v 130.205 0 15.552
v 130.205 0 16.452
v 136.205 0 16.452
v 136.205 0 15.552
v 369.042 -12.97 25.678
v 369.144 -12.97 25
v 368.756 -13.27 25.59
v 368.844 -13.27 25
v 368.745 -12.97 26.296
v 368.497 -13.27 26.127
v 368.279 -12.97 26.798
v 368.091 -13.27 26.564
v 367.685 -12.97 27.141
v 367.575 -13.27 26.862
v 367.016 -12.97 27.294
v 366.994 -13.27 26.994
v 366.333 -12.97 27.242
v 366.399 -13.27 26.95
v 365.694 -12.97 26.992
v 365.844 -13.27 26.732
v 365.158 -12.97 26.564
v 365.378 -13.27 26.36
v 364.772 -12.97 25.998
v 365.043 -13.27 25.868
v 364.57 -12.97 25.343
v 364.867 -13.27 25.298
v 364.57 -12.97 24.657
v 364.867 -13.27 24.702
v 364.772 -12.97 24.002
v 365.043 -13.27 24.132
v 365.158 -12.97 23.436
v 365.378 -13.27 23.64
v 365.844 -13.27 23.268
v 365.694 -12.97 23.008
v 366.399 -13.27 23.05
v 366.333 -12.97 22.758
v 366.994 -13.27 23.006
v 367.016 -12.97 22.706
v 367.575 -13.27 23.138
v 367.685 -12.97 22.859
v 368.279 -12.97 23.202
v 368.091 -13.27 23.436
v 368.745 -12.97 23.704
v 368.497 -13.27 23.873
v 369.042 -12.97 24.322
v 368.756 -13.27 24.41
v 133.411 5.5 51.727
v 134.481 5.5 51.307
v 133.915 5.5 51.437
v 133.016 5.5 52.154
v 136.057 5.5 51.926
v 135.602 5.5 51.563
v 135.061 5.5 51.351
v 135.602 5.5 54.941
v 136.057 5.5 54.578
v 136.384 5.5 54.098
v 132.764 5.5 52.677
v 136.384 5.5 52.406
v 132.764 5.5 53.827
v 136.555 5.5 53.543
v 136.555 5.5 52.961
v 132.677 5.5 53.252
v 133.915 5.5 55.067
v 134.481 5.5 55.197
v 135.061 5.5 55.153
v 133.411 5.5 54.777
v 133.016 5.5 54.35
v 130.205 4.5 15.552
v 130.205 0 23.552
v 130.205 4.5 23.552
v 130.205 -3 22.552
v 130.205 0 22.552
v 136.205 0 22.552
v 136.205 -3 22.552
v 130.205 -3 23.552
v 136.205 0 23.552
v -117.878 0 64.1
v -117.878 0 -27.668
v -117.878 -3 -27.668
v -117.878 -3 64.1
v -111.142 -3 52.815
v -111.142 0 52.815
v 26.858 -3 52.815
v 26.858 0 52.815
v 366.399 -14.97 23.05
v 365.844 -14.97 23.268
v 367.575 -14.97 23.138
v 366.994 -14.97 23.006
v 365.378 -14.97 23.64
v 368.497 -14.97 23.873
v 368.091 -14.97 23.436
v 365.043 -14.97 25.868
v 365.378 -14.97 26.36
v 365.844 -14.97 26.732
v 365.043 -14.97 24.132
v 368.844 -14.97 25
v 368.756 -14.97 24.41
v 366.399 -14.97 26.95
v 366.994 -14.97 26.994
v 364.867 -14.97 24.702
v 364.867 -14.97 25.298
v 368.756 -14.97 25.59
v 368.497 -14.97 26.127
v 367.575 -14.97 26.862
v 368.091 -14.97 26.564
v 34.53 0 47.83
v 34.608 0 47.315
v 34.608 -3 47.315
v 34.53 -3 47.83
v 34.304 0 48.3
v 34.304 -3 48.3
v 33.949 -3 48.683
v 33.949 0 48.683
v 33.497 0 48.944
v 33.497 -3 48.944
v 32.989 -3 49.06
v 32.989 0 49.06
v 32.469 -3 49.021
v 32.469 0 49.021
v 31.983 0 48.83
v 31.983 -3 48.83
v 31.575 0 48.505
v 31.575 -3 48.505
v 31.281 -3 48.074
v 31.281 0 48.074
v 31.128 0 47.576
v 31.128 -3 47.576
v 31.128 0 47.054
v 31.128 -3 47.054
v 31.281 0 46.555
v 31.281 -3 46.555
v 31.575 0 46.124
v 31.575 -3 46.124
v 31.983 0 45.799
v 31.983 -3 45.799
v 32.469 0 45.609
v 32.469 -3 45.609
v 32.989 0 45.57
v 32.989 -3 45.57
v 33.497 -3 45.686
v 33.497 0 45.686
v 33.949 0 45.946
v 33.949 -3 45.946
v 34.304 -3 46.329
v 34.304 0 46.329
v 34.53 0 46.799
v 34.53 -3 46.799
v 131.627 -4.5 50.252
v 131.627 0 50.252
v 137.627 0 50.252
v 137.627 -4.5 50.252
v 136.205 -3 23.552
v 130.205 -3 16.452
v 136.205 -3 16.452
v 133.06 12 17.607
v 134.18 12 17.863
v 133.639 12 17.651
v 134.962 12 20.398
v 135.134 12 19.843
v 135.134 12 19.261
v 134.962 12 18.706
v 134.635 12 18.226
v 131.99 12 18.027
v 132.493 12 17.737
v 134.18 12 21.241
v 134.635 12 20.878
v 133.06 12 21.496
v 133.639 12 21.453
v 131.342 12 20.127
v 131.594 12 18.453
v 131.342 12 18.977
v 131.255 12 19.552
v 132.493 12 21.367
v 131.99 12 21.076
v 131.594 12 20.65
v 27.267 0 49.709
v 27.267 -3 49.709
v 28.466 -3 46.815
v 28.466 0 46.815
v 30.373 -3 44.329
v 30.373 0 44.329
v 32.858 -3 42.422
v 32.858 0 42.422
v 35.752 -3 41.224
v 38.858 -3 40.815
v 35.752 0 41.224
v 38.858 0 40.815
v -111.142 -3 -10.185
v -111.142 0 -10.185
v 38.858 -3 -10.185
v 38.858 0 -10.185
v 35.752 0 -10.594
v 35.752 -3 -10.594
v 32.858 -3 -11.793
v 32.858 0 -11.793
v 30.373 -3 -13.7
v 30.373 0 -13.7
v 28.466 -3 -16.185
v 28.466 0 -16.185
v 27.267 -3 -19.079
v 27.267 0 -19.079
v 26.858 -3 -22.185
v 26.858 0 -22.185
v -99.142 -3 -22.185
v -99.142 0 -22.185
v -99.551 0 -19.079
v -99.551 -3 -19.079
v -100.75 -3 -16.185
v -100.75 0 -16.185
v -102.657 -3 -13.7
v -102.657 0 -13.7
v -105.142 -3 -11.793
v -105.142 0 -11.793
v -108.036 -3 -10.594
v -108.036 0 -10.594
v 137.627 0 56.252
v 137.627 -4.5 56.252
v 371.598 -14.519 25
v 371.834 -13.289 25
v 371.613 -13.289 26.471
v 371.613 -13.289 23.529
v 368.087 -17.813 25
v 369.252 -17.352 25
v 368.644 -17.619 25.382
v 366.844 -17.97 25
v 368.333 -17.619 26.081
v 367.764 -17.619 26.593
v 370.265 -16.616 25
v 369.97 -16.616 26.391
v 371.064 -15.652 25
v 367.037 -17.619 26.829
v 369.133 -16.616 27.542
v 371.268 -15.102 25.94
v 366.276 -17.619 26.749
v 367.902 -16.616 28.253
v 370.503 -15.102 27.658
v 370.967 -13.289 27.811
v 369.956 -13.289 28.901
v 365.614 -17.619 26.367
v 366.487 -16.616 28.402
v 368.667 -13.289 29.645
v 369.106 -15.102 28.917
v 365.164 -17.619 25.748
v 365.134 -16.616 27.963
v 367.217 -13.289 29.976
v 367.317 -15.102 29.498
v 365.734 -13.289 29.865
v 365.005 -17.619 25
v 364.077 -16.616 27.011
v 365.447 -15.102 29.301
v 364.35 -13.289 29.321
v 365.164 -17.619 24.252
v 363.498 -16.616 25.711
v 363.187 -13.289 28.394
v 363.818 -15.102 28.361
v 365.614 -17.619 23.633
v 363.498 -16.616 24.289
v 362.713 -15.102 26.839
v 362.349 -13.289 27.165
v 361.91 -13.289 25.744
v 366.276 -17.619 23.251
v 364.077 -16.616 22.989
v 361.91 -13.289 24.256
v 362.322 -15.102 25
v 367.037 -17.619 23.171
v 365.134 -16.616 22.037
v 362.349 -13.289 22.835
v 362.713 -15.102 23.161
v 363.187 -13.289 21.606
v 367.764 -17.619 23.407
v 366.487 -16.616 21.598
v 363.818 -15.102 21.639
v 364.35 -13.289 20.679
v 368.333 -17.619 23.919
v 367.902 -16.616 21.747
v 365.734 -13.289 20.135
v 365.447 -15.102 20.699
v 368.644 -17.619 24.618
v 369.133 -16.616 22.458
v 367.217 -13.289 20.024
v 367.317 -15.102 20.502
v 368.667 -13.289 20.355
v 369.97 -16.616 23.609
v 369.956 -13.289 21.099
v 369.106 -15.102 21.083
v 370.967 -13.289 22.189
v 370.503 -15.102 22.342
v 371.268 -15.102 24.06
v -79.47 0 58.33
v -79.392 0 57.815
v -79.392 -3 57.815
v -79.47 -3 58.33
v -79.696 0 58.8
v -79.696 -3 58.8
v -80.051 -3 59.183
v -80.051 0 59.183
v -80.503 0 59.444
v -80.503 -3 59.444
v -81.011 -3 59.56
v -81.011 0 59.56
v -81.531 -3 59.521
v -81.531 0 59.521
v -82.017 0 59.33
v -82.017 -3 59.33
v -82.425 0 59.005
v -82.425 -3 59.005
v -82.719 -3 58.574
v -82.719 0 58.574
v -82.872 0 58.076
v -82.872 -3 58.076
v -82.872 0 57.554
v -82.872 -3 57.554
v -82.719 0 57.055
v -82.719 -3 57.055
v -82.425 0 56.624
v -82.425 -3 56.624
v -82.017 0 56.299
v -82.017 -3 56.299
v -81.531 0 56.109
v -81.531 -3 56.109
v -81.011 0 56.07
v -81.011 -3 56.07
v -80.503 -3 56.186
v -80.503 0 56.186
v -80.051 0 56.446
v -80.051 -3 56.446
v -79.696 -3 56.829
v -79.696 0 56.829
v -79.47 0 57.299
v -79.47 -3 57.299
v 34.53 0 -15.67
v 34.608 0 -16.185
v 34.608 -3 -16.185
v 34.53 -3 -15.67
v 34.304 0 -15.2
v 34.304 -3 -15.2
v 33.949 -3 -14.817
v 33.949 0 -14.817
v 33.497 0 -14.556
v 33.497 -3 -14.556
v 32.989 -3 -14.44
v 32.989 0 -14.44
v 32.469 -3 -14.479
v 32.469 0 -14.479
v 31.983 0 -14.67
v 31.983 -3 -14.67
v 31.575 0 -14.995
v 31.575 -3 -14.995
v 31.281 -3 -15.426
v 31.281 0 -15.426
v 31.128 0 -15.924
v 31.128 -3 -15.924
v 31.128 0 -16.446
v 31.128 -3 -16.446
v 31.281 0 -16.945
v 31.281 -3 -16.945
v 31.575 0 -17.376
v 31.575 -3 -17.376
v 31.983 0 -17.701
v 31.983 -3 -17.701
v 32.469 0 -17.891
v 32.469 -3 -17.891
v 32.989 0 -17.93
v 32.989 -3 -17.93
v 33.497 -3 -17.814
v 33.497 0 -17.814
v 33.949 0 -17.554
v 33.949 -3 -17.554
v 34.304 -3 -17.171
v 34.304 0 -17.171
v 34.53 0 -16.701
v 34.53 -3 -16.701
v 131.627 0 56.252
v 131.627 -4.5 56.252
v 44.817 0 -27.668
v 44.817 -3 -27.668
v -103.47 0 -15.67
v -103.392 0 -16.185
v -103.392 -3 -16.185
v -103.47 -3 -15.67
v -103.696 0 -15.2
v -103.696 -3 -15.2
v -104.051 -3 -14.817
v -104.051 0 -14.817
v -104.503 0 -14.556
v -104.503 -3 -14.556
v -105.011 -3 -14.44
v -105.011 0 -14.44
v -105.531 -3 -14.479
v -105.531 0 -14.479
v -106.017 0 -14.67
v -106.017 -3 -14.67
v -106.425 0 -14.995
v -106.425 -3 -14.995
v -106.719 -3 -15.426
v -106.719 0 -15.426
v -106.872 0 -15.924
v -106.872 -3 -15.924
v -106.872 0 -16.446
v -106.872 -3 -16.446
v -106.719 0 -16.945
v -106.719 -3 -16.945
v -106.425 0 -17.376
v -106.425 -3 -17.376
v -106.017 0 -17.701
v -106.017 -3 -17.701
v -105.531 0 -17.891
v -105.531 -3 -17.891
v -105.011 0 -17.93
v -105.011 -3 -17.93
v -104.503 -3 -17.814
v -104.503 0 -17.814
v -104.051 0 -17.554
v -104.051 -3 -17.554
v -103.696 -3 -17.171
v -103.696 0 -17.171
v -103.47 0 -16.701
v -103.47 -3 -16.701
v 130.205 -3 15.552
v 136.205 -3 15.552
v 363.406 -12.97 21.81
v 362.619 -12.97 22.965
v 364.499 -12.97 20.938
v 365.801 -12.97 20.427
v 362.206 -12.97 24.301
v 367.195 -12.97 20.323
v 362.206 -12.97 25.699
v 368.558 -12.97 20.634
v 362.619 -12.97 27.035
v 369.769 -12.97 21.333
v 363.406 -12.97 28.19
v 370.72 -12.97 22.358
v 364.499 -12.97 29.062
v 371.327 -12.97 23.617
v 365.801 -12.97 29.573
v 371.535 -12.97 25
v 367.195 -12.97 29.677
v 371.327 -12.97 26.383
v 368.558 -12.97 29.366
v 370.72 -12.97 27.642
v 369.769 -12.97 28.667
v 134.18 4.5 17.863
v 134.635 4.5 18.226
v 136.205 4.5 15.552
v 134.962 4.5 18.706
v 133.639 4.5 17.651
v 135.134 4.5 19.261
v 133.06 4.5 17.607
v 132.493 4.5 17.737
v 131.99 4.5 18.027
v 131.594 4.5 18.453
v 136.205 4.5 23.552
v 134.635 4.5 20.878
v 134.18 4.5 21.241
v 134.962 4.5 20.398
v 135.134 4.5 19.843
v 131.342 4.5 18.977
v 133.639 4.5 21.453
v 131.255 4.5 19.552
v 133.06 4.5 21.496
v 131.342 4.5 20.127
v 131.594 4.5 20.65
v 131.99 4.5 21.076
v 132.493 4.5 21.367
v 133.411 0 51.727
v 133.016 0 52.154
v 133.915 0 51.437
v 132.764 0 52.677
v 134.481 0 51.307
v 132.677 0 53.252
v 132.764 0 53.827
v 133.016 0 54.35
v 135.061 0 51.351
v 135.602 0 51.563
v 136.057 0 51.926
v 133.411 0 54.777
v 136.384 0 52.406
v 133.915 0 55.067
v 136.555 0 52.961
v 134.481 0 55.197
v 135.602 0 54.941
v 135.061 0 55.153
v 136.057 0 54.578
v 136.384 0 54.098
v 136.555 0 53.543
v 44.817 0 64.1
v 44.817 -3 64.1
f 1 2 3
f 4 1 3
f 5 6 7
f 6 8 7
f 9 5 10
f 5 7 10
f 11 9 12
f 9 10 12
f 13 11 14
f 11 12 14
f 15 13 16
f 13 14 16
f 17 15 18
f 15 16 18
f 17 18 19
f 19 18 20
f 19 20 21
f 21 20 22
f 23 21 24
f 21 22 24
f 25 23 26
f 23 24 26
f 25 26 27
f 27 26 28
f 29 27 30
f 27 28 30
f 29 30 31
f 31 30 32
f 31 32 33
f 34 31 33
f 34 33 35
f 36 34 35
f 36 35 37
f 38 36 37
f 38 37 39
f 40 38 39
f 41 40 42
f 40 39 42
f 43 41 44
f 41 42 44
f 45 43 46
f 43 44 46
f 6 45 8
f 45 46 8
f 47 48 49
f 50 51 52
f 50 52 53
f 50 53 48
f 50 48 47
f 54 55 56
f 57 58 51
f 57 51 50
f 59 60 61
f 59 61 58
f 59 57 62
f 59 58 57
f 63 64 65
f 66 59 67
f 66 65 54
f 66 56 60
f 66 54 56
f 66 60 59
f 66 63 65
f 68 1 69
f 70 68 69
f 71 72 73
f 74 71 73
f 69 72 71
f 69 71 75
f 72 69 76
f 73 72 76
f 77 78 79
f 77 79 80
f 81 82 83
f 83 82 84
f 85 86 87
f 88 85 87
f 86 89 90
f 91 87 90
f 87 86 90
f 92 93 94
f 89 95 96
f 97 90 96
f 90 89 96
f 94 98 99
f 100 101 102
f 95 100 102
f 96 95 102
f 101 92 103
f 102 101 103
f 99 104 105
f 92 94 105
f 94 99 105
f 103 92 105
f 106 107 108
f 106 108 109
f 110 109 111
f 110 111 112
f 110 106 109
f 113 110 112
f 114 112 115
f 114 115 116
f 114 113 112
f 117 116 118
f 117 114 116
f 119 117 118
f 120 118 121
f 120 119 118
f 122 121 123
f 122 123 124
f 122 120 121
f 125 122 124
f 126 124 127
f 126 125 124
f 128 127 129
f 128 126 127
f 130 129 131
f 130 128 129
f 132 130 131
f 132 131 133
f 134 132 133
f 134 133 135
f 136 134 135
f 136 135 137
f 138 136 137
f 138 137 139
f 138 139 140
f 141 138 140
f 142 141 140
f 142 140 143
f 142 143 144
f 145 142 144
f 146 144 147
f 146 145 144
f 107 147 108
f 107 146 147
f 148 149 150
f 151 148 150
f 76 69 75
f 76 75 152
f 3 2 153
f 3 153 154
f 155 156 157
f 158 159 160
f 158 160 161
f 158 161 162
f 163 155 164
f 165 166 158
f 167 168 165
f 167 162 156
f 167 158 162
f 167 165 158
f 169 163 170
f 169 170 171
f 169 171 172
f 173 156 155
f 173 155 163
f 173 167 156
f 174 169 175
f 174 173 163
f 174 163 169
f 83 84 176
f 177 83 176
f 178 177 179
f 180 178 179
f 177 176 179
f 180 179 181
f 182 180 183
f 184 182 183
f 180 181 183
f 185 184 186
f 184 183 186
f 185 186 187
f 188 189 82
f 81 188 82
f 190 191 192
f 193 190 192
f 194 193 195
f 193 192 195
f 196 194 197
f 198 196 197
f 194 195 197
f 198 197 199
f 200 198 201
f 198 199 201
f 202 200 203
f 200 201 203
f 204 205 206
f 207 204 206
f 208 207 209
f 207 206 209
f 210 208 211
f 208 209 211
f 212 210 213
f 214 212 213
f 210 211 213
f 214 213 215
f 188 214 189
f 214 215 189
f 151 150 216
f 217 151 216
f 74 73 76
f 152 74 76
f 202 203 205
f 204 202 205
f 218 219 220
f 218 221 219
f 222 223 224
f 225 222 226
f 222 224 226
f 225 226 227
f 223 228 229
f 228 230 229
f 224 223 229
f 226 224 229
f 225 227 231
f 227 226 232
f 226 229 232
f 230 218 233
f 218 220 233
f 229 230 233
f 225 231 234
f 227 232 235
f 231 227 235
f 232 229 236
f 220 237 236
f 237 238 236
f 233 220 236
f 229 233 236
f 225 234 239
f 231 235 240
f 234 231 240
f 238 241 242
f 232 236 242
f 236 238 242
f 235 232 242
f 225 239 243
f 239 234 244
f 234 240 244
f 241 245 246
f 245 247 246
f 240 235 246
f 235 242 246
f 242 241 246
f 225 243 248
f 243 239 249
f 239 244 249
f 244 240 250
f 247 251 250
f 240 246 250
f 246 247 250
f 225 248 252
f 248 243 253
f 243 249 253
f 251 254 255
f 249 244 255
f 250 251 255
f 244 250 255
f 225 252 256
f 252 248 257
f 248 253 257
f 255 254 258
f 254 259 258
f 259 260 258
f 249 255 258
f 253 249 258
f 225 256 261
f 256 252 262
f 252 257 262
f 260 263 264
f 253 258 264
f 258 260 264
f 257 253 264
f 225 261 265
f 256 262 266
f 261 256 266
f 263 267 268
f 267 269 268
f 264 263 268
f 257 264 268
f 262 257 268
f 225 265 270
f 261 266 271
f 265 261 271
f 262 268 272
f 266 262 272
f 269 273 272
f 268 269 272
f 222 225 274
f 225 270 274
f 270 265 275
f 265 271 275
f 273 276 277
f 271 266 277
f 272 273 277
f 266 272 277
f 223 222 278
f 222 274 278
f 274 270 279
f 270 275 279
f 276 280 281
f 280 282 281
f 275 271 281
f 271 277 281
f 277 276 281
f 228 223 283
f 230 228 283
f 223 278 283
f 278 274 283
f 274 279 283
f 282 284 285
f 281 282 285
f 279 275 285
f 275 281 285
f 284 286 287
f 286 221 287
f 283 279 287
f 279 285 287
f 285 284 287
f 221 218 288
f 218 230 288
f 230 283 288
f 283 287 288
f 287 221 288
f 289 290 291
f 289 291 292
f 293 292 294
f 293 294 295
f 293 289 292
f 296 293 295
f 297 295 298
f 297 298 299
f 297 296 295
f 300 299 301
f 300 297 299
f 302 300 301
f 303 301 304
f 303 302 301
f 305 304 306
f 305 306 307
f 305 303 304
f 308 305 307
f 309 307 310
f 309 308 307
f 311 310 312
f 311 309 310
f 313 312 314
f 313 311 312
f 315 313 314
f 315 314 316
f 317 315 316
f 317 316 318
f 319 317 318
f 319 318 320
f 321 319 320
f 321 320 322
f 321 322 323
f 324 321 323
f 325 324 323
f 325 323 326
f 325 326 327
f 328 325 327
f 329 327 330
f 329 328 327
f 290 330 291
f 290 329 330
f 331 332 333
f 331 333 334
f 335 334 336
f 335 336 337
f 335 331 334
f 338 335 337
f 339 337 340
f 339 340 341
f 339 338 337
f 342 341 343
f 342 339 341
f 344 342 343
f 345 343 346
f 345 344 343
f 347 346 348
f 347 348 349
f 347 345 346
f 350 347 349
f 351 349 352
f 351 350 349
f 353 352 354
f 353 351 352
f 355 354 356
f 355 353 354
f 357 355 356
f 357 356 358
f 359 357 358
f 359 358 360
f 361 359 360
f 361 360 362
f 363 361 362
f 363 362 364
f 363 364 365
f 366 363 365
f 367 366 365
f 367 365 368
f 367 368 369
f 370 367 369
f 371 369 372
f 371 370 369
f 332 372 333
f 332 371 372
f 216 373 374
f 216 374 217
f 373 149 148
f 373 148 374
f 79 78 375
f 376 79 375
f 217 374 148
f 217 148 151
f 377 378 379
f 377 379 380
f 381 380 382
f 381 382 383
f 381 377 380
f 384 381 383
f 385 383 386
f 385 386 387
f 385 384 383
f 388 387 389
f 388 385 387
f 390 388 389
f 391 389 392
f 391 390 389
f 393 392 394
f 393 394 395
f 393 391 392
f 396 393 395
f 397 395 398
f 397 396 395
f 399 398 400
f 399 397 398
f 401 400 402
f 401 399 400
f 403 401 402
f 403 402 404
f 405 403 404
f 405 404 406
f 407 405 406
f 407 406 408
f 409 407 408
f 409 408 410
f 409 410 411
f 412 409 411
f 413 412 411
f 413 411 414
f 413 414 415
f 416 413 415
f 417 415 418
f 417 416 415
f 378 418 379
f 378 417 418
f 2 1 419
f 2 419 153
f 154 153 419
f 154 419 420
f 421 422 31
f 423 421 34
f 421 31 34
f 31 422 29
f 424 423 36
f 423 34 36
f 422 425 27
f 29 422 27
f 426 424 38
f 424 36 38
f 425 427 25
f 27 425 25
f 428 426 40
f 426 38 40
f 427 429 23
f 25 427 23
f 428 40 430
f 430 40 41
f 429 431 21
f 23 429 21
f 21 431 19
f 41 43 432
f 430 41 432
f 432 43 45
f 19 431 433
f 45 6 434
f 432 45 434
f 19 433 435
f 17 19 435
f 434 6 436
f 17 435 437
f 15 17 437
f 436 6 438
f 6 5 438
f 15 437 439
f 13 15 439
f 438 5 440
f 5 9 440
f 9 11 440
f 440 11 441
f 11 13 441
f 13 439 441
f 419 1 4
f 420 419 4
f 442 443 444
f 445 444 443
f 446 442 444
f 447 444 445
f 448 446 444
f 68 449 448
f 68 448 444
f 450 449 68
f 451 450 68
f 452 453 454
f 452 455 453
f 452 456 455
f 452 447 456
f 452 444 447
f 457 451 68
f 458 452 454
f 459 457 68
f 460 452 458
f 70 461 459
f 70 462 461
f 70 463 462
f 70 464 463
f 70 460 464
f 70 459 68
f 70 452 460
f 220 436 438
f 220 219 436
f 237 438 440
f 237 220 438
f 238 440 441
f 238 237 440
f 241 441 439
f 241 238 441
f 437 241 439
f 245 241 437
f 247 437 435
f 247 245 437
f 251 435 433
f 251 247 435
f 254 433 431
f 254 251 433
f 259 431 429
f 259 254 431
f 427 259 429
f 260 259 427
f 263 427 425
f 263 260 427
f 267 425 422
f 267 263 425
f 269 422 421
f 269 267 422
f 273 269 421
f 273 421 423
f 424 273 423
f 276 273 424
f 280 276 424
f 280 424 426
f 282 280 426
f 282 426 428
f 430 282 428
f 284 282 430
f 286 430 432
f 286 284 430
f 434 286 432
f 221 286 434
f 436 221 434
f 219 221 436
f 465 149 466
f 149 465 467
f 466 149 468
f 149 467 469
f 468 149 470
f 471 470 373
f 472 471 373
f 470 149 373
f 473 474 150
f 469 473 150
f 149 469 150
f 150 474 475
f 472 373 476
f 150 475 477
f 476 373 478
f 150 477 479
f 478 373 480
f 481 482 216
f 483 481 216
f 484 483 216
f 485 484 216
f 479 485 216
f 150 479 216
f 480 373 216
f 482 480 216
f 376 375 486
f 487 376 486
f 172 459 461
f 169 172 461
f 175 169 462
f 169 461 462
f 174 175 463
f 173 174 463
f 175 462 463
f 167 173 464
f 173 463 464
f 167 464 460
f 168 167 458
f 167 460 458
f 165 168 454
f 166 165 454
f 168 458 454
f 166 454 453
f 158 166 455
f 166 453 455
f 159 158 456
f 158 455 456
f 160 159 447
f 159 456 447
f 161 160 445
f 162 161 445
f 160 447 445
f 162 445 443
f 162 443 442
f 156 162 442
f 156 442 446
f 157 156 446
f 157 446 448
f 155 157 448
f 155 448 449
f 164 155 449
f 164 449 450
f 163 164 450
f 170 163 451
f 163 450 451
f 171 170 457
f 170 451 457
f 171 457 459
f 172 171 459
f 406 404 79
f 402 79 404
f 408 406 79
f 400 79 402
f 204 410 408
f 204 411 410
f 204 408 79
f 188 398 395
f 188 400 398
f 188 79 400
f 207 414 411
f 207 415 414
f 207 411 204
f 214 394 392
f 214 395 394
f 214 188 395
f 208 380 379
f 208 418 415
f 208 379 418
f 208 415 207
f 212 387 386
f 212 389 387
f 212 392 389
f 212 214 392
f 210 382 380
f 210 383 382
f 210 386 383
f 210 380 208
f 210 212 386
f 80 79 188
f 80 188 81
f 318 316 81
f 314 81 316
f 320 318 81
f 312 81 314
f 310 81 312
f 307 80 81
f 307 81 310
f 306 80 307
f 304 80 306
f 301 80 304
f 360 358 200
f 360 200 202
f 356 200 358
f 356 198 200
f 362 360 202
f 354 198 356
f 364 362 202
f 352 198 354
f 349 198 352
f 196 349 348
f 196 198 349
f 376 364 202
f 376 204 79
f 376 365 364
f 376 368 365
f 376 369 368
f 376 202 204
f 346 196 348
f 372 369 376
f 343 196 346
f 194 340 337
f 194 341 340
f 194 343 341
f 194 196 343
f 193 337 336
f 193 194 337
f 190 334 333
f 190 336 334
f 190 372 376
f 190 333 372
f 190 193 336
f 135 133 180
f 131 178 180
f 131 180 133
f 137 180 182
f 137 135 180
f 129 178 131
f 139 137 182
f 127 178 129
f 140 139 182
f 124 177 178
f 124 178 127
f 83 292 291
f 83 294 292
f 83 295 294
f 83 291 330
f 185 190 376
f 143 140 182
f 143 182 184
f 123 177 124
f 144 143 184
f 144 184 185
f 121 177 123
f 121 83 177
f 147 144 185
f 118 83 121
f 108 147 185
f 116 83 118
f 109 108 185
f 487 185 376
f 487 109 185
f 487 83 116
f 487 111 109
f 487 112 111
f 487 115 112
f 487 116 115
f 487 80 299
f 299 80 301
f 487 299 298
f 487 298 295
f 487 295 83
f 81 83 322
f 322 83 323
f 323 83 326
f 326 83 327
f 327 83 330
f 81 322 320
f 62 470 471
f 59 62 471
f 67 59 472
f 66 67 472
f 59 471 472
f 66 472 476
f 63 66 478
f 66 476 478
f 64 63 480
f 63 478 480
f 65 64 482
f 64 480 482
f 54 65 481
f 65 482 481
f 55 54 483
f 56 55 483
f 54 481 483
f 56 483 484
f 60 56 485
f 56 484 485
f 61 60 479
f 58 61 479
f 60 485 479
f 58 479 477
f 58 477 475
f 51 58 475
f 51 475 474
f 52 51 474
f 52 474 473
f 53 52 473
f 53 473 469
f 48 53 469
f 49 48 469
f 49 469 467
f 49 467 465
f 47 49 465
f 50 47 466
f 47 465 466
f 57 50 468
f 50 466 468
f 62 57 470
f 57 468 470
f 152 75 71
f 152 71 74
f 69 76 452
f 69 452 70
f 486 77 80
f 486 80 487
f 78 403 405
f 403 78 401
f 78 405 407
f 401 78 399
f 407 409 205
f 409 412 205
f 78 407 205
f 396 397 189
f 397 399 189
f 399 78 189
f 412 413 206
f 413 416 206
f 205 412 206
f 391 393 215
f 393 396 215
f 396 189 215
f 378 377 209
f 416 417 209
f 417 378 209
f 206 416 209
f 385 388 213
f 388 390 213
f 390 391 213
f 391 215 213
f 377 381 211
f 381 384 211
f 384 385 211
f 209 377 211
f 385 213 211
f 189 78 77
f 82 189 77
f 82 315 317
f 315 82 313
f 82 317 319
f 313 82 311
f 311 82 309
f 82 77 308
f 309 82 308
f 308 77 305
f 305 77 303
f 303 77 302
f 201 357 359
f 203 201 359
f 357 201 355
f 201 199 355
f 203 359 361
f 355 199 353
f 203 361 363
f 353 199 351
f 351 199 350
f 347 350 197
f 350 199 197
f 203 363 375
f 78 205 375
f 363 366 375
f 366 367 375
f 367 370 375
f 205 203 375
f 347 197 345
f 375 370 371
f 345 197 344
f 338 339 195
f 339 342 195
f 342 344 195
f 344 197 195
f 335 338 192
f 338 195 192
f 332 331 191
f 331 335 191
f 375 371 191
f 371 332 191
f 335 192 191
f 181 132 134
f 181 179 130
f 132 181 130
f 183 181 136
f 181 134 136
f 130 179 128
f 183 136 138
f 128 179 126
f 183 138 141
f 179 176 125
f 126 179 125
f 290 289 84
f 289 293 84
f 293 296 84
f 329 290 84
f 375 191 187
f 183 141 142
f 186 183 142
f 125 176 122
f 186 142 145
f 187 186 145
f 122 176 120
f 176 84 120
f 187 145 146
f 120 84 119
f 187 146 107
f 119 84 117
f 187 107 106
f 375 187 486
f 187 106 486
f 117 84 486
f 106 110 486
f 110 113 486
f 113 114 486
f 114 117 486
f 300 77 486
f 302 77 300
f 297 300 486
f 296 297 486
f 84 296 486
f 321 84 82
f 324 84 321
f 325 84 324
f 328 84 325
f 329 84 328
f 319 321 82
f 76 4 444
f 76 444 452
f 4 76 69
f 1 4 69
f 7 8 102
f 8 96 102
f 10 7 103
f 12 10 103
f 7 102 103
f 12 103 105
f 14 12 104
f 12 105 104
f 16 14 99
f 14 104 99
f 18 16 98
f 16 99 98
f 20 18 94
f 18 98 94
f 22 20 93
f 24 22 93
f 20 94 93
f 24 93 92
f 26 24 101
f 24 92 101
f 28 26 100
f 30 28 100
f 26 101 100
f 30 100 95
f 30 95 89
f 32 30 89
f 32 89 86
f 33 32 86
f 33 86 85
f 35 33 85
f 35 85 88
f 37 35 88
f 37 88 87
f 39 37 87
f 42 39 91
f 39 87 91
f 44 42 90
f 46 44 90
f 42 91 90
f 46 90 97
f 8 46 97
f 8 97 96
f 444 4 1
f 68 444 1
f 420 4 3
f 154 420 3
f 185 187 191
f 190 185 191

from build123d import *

# Parameters (mm, degrees)
F0_W      = 162.6942493021
F0_H      = 91.7676277459
F0_R      = 1.75
F1_DEPTH  = 3
F2_W      = 6
F2_H      = 6
F3_DEPTH  = 4.5
F4_R      = 1.95
F5_DEPTH  = 5.5
F6_W      = 6
F6_H      = 1
F7_DEPTH  = 3
F6_H_2    = 0.9
F8_W      = 6
F8_H      = 8
F9_DEPTH  = 4.5
F10_R     = 1.95
F11_DEPTH = 7.5


# Not quite as in the source:
# - a fillet or chamfer that OpenCascade refuses, or shapes differently, is made with other operations: its cross-section is extruded or revolved along the edge and cut away or added


with BuildPart() as f1:
    # F0 (on Front) → F1 (new body)
    with BuildSketch(Plane.XZ):
        with Locations((-36.5303959697, 18.2162802666)):
            Rectangle(F0_W, F0_H)
        with Locations((-105.142032113, -16.1853220011)):
            Circle(F0_R, mode=Mode.SUBTRACT)
        with Locations((32.857967887, -16.1853220011)):
            Circle(F0_R, mode=Mode.SUBTRACT)
        with BuildLine():
            Line((-111.142032113, -10.1853220011), (-111.142032113, 52.8146779989))
            Line((-111.142032113, 52.8146779989), (26.857967887, 52.8146779989))
            ThreePointArc((26.857967887, 52.8146779989), (30.3726865127, 44.3293966246), (38.857967887, 40.8146779989))
            Line((38.857967887, 40.8146779989), (38.857967887, -10.1853220011))
            ThreePointArc((38.857967887, -10.1853220011), (30.3726865127, -13.7000406269), (26.857967887, -22.1853220011))
            Line((26.857967887, -22.1853220011), (-99.142032113, -22.1853220011))
            ThreePointArc((-99.142032113, -22.1853220011), (-102.6567507388, -13.7000406269), (-111.142032113, -10.1853220011))
        make_face(mode=Mode.SUBTRACT)
        with Locations((-81.142032113, 57.8146779989)):
            Circle(F0_R, mode=Mode.SUBTRACT)
        with Locations((32.857967887, 47.3146779989)):
            Circle(F0_R, mode=Mode.SUBTRACT)
    extrude(amount=F1_DEPTH)


with BuildPart() as f3:
    # F2 (on Front) → F3 (new body)
    with BuildSketch(Plane.XZ):
        with Locations((134.6271275282, 53.2519980073)):
            Rectangle(F2_W, F2_H)
    extrude(amount=F3_DEPTH)

    # F4 (on face) → F5 (join)
    with BuildSketch(Plane(origin=(0, 0, 0), x_dir=(-1, 0, 0), z_dir=(0, 1, 0))):
        with Locations((-134.6271275282, 53.2519980073)):
            Circle(F4_R)
    extrude(amount=F5_DEPTH)


with BuildPart() as f7:
    # F6 (on Front) → F7 (new body)
    with BuildSketch(Plane.XZ):
        with Locations((133.2053928375, 23.0518818647)):
            Rectangle(F6_W, F6_H)
    extrude(amount=F7_DEPTH)


with BuildPart() as f7b:
    # F6 (on Front) → F7, piece 2 (new body)
    with BuildSketch(Plane.XZ):
        with Locations((133.2053928375, 16.0018818647)):
            Rectangle(F6_W, F6_H_2)
    extrude(amount=F7_DEPTH)


with BuildPart() as f9:
    # F8 (on face) → F9 (new body)
    with BuildSketch(Plane(origin=(0, 0, 0), x_dir=(-1, 0, 0), z_dir=(0, 1, 0))):
        with Locations((-133.2053928375, 19.5518818647)):
            Rectangle(F8_W, F8_H)
    extrude(amount=F9_DEPTH)

    # F10 (on face) → F11 (join)
    with BuildSketch(Plane(origin=(0, 4.5, 0), x_dir=(-1, 0, 0), z_dir=(0, 1, 0))):
        with Locations((-133.2053928375, 19.5518818647)):
            Circle(F10_R)
    extrude(amount=F11_DEPTH)


with BuildPart() as f14:
    # F13 (on face) → F14 (revolve)
    with BuildSketch(Plane.XY.offset(25)):
        with BuildLine():
            Line((366.844489096, -14.9696936347), (366.844489096, -17.9696936347))
            ThreePointArc((366.844489096, -17.9696936347), (370.3800230019, -16.5052275406), (371.844489096, -12.9696936347))
            Line((371.844489096, -12.9696936347), (368.844489096, -12.9696936347))
            Line((368.844489096, -12.9696936347), (368.844489096, -14.9696936347))
            Line((368.844489096, -14.9696936347), (366.844489096, -14.9696936347))
        make_face()
    revolve(axis=Axis((366.844489096, -20.7170091908, 25), (0, -1, 0)))

    # F15: chamfer of 0.3 on 2 edges, made by hand

    # F15_s1 → F15_t2 (revolve, cut)
    with BuildSketch(Plane.XY.offset(25)):
        Polygon((369.144489096, -12.9696936347), (368.844489096, -13.2696936347), (368.844489096, -12.9696936347), align=None)
    revolve(axis=Axis((366.844489096, -12.9696936347, 25), (0, -1, 0)), mode=Mode.SUBTRACT)

    # F15_s3 → F15_t4 (revolve, cut)
    with BuildSketch(Plane.XY.offset(25)):
        with BuildLine():
            Line((371.5349048558, -12.9696936347), (371.8342930958, -13.2888425708))
            ThreePointArc((371.8342930958, -13.2888425708), (371.8418022214, -13.133588499), (371.844489096, -12.9696936347))
            Line((371.844489096, -12.9696936347), (371.5349048558, -12.9696936347))
        make_face()
    revolve(axis=Axis((366.844489096, -12.9696936347, 25), (0, -1, 0)), mode=Mode.SUBTRACT)


solid = Compound([f1.part, f3.part, f7.part, f7b.part, f9.part, f14.part])
